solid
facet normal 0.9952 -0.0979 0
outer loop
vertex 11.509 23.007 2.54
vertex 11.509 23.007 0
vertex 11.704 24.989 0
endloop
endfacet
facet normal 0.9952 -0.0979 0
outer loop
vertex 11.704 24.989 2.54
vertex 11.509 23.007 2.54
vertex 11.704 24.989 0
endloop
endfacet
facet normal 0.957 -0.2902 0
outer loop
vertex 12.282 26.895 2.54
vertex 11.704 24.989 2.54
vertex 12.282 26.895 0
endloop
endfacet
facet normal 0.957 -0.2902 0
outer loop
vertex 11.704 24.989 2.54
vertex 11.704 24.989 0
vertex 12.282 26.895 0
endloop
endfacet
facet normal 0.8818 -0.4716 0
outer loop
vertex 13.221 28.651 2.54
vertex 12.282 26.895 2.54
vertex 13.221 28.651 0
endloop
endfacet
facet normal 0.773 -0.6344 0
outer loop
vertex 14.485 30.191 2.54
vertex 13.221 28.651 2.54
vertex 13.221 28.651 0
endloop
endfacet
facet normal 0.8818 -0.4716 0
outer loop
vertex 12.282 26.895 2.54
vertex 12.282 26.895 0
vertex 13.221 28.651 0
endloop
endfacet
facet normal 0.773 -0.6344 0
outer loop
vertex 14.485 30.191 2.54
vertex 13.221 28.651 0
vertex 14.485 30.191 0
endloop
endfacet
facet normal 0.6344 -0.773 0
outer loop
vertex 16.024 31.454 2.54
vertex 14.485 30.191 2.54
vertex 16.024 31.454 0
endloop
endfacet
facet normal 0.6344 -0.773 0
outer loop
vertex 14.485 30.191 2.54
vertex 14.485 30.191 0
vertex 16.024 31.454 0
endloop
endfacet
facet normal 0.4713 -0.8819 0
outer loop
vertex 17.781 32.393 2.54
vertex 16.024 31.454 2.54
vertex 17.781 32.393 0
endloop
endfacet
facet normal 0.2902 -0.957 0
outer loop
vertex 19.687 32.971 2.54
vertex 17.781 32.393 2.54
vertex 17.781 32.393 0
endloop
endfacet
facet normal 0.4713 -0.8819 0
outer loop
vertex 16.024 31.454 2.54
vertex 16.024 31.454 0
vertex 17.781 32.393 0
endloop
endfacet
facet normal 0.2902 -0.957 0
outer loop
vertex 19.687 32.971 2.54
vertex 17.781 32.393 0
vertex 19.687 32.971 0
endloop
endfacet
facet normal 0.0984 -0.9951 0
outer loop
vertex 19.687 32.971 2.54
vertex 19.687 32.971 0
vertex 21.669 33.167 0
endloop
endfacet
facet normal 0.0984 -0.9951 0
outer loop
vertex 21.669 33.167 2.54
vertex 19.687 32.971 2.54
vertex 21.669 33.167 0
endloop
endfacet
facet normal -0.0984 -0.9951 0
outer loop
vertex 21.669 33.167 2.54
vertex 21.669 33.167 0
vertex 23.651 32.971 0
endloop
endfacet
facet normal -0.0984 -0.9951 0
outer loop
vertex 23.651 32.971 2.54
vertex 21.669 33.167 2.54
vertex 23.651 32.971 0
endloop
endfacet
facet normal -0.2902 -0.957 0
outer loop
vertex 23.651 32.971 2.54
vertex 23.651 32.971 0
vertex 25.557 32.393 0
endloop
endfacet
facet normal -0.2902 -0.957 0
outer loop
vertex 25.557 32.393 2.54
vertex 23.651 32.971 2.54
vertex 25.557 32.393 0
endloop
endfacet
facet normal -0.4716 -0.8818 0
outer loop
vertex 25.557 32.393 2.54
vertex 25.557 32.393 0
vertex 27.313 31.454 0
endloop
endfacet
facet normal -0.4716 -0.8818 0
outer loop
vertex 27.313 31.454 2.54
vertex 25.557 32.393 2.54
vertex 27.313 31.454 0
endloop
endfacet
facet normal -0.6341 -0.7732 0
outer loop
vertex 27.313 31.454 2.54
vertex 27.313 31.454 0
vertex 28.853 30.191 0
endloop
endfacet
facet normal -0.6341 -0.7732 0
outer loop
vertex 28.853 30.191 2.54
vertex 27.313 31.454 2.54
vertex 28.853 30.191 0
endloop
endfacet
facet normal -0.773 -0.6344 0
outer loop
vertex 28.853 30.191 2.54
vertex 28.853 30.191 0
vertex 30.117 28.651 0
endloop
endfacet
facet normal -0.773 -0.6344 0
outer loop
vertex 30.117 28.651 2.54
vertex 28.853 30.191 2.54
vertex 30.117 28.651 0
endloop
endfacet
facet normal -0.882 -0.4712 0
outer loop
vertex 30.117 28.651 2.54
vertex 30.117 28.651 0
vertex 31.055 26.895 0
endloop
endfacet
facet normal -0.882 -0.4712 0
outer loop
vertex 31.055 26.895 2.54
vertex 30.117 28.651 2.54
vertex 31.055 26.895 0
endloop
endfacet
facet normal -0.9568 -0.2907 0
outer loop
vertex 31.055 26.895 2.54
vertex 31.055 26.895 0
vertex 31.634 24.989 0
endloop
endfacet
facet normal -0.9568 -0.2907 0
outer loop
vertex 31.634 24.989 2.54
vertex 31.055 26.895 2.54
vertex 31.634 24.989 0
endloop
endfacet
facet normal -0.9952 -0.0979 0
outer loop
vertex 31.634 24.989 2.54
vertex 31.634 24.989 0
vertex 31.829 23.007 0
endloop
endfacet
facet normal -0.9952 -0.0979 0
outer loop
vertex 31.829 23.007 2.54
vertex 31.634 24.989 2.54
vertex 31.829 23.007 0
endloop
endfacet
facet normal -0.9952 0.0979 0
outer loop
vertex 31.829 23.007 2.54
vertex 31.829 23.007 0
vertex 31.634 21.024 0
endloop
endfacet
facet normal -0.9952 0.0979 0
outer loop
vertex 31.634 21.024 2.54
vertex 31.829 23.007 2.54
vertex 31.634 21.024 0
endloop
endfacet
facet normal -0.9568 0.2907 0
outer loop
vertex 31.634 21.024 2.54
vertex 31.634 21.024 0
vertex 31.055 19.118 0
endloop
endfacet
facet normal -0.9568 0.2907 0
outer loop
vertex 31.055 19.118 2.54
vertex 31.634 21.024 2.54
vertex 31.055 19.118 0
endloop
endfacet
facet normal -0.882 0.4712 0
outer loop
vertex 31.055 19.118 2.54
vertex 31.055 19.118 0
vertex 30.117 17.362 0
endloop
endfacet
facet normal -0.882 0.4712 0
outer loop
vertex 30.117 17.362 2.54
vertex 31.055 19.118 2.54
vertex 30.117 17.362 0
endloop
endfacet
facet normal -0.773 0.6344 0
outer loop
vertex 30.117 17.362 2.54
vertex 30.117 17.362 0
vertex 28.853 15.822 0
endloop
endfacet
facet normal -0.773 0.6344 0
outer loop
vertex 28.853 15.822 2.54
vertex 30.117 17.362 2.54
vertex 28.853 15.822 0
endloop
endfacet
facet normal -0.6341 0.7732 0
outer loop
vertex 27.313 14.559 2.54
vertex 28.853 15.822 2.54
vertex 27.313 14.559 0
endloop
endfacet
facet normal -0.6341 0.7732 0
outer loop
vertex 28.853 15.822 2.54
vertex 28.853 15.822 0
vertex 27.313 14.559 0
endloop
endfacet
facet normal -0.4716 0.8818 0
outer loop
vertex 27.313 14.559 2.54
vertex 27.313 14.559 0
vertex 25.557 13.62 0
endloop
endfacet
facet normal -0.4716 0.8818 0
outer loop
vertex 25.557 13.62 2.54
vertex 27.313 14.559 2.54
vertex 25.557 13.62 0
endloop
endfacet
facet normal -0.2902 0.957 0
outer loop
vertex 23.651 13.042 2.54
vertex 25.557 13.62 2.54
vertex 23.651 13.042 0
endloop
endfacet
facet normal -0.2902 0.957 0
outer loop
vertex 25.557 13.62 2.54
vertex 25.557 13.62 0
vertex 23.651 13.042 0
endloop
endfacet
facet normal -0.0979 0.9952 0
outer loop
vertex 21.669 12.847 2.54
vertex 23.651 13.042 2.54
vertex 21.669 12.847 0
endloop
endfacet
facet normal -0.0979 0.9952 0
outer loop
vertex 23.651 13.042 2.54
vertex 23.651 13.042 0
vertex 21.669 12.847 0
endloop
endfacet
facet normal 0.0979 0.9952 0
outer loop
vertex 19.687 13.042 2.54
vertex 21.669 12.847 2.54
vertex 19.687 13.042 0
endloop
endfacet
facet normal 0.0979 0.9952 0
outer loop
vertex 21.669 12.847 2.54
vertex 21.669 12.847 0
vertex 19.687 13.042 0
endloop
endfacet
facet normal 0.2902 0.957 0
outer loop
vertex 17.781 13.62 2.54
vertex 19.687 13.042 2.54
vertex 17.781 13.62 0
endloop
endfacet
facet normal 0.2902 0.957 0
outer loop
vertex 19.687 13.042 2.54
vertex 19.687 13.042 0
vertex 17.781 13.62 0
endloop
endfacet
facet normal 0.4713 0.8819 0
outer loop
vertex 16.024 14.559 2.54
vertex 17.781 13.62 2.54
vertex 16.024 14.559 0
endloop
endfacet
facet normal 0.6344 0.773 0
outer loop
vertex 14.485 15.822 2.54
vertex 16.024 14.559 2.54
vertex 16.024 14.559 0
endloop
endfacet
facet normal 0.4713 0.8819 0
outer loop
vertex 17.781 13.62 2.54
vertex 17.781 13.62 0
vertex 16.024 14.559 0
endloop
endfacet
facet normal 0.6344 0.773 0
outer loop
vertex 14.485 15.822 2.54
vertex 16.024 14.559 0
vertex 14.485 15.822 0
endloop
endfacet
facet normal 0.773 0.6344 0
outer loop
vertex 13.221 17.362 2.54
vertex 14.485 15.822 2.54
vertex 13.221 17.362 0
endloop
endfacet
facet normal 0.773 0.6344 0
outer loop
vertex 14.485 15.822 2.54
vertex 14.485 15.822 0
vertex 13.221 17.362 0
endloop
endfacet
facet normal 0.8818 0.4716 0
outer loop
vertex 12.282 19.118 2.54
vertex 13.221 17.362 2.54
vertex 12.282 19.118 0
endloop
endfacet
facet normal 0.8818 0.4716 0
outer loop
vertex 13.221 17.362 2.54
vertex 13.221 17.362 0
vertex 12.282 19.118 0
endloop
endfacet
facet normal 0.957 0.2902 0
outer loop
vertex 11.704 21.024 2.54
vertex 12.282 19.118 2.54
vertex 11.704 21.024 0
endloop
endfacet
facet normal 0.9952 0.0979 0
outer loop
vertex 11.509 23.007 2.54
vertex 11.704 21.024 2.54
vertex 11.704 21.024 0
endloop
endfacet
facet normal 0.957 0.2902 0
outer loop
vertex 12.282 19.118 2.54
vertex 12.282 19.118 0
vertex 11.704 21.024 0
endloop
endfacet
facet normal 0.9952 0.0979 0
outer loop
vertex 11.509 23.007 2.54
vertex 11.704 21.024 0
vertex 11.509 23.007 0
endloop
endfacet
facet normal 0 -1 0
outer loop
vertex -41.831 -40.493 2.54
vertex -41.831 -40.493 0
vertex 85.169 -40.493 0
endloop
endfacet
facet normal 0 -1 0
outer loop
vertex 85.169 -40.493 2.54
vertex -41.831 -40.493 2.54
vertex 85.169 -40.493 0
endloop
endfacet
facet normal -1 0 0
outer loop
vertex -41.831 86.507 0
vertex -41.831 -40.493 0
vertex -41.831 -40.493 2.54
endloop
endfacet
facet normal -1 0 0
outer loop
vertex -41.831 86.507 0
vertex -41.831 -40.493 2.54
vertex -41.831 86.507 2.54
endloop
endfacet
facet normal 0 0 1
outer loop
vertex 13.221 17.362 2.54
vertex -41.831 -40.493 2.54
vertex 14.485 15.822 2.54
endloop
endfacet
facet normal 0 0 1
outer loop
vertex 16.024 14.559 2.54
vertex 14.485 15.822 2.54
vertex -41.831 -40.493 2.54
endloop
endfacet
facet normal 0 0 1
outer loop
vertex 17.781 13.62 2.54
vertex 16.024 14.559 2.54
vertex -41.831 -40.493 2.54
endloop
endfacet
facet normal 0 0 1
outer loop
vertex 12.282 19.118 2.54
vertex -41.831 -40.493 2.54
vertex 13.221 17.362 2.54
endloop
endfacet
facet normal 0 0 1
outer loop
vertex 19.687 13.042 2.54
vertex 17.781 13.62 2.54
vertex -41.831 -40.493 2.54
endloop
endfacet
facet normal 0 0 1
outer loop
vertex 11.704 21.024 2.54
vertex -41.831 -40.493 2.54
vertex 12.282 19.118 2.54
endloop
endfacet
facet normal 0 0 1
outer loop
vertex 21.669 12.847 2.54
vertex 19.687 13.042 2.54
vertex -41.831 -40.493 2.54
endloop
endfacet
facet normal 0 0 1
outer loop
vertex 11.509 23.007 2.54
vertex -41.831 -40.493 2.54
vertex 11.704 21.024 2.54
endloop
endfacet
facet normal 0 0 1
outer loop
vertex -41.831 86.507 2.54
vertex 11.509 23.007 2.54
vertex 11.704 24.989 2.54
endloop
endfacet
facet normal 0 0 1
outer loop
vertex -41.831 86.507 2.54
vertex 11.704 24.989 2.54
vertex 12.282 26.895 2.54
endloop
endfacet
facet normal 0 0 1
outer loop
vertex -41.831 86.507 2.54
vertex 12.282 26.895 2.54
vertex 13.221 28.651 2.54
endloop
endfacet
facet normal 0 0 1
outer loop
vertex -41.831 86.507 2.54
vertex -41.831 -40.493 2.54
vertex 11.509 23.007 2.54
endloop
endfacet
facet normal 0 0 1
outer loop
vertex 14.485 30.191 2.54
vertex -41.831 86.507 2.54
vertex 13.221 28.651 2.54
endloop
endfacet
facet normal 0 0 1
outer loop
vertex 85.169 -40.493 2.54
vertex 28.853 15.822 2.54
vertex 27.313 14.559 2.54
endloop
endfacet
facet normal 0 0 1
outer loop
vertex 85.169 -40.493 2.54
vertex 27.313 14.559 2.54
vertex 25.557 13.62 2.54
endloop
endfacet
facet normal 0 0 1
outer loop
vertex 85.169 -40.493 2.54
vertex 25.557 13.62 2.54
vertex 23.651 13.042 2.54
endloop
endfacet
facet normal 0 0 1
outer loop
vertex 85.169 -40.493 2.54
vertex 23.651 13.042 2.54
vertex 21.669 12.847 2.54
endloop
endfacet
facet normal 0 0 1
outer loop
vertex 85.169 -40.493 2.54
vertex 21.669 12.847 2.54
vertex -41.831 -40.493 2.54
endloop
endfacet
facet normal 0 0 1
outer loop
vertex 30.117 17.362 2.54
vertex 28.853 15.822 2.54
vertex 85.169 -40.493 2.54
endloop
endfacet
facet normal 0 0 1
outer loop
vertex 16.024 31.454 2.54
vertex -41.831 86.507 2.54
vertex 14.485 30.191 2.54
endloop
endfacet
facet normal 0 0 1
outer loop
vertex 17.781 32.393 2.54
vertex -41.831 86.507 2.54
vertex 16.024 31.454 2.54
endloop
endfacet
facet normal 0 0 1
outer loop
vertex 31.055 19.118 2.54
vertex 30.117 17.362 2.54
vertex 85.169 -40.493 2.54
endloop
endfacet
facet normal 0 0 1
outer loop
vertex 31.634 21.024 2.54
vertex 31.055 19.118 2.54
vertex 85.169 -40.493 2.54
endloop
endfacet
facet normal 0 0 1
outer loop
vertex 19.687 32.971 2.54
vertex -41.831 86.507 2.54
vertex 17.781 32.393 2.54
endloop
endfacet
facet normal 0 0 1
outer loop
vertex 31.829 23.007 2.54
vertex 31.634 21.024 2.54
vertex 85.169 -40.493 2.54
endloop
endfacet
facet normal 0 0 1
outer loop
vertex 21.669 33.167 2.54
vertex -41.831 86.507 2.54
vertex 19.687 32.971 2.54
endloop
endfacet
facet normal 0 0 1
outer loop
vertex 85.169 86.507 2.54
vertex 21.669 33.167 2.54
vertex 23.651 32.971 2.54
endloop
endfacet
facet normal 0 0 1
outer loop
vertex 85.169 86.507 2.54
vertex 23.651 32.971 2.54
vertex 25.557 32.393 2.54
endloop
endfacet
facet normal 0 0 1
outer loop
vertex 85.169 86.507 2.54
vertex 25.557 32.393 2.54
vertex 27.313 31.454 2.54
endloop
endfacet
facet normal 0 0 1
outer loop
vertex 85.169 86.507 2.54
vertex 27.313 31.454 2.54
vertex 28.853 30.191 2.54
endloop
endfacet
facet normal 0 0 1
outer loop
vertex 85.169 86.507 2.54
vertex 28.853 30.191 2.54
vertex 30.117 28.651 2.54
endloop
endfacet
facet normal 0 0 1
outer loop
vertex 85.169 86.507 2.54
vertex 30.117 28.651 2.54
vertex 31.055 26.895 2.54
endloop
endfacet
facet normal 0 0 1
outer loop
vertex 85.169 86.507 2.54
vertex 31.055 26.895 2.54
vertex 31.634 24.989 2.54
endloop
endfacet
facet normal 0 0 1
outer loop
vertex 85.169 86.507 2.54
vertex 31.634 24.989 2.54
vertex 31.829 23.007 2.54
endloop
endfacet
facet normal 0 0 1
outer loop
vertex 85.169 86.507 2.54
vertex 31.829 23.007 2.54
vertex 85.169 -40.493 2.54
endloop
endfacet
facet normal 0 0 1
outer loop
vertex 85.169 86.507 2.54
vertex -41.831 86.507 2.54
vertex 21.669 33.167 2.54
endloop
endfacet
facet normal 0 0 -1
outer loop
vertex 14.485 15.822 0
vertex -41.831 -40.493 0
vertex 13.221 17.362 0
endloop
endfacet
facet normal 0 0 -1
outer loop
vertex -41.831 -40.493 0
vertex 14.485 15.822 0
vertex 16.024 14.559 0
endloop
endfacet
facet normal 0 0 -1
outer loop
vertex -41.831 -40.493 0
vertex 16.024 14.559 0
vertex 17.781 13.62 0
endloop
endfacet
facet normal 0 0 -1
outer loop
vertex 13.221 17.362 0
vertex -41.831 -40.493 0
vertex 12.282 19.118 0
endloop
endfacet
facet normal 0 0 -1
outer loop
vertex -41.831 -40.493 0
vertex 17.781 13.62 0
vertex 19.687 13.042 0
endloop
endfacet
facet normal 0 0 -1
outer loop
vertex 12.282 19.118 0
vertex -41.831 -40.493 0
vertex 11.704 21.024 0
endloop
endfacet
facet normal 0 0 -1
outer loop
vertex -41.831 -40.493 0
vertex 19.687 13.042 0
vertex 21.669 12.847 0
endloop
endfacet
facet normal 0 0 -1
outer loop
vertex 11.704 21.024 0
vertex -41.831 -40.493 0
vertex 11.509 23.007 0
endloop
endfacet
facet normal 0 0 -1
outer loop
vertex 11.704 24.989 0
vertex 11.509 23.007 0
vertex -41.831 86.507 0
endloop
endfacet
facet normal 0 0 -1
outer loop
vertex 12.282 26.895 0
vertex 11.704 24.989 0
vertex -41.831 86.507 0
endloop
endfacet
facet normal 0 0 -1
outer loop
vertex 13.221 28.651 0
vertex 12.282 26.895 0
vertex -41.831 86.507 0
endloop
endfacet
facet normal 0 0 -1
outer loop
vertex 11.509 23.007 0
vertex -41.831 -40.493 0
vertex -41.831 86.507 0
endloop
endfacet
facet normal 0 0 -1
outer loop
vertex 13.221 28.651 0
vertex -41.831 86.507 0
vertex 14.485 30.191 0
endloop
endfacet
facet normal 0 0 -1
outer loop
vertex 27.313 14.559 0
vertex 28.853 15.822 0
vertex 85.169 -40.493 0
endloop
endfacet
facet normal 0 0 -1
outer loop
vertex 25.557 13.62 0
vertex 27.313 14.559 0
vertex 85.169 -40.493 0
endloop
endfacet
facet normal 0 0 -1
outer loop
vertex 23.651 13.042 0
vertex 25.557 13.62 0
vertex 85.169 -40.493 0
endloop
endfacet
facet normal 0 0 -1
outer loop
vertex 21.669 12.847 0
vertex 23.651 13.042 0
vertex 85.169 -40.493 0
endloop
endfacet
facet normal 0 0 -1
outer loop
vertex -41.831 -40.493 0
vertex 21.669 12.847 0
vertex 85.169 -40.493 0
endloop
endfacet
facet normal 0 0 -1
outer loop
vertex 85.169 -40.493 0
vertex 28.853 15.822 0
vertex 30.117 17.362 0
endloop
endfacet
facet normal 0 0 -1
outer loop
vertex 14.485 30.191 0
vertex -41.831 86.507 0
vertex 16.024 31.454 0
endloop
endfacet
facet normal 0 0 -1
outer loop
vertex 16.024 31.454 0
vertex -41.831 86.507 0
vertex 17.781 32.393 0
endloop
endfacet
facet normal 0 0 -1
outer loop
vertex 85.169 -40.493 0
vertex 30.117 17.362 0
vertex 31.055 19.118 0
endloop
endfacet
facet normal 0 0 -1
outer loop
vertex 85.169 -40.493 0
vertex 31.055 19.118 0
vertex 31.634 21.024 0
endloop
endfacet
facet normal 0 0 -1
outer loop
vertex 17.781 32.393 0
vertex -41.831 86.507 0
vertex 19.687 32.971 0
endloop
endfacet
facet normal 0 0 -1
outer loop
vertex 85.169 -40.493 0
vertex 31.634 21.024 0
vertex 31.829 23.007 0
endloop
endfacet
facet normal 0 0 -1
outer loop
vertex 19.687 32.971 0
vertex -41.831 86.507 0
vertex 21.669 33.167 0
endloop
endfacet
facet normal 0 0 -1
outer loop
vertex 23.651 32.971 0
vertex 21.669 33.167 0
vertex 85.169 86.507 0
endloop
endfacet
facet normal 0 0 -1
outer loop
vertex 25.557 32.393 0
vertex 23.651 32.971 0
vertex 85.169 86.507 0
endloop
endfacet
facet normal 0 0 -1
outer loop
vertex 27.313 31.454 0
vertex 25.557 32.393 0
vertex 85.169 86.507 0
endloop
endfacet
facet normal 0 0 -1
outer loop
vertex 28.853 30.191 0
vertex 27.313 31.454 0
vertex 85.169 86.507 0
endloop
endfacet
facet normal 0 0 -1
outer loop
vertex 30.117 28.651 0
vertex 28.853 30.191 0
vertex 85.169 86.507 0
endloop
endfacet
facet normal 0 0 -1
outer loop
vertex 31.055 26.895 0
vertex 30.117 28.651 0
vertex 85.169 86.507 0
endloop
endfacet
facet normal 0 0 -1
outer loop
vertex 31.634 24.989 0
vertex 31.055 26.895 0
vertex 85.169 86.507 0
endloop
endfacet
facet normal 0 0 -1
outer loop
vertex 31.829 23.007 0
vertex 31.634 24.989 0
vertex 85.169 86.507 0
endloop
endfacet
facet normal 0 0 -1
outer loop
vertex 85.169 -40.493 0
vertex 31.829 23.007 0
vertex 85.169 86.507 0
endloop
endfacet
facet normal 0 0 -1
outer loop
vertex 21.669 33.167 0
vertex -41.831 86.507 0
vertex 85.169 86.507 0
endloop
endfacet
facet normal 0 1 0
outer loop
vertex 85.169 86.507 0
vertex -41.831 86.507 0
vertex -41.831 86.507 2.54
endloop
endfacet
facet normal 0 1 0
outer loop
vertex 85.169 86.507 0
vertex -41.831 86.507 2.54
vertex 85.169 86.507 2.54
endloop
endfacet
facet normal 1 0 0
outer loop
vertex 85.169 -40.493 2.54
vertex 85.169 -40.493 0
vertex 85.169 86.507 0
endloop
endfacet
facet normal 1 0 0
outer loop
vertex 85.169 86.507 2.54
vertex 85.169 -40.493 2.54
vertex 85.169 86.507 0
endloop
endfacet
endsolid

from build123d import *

# Parameters (mm, degrees)
F0_W     = 127
F0_H     = 127
F1_DEPTH = 2.54
F3_D     = 20.32


with BuildPart() as f1:
    # F0 (on Top) → F1 (new body)
    with BuildSketch(Plane.XY):
        with Locations((21.668797, 23.006538)):
            Rectangle(F0_W, F0_H)
    extrude(amount=F1_DEPTH)

    # F3 (through all)
    with Locations(Plane.XY.offset(2.54)):
        with Locations((21.668797, 23.006538)):
            Hole(F3_D / 2)


solid = f1.part
